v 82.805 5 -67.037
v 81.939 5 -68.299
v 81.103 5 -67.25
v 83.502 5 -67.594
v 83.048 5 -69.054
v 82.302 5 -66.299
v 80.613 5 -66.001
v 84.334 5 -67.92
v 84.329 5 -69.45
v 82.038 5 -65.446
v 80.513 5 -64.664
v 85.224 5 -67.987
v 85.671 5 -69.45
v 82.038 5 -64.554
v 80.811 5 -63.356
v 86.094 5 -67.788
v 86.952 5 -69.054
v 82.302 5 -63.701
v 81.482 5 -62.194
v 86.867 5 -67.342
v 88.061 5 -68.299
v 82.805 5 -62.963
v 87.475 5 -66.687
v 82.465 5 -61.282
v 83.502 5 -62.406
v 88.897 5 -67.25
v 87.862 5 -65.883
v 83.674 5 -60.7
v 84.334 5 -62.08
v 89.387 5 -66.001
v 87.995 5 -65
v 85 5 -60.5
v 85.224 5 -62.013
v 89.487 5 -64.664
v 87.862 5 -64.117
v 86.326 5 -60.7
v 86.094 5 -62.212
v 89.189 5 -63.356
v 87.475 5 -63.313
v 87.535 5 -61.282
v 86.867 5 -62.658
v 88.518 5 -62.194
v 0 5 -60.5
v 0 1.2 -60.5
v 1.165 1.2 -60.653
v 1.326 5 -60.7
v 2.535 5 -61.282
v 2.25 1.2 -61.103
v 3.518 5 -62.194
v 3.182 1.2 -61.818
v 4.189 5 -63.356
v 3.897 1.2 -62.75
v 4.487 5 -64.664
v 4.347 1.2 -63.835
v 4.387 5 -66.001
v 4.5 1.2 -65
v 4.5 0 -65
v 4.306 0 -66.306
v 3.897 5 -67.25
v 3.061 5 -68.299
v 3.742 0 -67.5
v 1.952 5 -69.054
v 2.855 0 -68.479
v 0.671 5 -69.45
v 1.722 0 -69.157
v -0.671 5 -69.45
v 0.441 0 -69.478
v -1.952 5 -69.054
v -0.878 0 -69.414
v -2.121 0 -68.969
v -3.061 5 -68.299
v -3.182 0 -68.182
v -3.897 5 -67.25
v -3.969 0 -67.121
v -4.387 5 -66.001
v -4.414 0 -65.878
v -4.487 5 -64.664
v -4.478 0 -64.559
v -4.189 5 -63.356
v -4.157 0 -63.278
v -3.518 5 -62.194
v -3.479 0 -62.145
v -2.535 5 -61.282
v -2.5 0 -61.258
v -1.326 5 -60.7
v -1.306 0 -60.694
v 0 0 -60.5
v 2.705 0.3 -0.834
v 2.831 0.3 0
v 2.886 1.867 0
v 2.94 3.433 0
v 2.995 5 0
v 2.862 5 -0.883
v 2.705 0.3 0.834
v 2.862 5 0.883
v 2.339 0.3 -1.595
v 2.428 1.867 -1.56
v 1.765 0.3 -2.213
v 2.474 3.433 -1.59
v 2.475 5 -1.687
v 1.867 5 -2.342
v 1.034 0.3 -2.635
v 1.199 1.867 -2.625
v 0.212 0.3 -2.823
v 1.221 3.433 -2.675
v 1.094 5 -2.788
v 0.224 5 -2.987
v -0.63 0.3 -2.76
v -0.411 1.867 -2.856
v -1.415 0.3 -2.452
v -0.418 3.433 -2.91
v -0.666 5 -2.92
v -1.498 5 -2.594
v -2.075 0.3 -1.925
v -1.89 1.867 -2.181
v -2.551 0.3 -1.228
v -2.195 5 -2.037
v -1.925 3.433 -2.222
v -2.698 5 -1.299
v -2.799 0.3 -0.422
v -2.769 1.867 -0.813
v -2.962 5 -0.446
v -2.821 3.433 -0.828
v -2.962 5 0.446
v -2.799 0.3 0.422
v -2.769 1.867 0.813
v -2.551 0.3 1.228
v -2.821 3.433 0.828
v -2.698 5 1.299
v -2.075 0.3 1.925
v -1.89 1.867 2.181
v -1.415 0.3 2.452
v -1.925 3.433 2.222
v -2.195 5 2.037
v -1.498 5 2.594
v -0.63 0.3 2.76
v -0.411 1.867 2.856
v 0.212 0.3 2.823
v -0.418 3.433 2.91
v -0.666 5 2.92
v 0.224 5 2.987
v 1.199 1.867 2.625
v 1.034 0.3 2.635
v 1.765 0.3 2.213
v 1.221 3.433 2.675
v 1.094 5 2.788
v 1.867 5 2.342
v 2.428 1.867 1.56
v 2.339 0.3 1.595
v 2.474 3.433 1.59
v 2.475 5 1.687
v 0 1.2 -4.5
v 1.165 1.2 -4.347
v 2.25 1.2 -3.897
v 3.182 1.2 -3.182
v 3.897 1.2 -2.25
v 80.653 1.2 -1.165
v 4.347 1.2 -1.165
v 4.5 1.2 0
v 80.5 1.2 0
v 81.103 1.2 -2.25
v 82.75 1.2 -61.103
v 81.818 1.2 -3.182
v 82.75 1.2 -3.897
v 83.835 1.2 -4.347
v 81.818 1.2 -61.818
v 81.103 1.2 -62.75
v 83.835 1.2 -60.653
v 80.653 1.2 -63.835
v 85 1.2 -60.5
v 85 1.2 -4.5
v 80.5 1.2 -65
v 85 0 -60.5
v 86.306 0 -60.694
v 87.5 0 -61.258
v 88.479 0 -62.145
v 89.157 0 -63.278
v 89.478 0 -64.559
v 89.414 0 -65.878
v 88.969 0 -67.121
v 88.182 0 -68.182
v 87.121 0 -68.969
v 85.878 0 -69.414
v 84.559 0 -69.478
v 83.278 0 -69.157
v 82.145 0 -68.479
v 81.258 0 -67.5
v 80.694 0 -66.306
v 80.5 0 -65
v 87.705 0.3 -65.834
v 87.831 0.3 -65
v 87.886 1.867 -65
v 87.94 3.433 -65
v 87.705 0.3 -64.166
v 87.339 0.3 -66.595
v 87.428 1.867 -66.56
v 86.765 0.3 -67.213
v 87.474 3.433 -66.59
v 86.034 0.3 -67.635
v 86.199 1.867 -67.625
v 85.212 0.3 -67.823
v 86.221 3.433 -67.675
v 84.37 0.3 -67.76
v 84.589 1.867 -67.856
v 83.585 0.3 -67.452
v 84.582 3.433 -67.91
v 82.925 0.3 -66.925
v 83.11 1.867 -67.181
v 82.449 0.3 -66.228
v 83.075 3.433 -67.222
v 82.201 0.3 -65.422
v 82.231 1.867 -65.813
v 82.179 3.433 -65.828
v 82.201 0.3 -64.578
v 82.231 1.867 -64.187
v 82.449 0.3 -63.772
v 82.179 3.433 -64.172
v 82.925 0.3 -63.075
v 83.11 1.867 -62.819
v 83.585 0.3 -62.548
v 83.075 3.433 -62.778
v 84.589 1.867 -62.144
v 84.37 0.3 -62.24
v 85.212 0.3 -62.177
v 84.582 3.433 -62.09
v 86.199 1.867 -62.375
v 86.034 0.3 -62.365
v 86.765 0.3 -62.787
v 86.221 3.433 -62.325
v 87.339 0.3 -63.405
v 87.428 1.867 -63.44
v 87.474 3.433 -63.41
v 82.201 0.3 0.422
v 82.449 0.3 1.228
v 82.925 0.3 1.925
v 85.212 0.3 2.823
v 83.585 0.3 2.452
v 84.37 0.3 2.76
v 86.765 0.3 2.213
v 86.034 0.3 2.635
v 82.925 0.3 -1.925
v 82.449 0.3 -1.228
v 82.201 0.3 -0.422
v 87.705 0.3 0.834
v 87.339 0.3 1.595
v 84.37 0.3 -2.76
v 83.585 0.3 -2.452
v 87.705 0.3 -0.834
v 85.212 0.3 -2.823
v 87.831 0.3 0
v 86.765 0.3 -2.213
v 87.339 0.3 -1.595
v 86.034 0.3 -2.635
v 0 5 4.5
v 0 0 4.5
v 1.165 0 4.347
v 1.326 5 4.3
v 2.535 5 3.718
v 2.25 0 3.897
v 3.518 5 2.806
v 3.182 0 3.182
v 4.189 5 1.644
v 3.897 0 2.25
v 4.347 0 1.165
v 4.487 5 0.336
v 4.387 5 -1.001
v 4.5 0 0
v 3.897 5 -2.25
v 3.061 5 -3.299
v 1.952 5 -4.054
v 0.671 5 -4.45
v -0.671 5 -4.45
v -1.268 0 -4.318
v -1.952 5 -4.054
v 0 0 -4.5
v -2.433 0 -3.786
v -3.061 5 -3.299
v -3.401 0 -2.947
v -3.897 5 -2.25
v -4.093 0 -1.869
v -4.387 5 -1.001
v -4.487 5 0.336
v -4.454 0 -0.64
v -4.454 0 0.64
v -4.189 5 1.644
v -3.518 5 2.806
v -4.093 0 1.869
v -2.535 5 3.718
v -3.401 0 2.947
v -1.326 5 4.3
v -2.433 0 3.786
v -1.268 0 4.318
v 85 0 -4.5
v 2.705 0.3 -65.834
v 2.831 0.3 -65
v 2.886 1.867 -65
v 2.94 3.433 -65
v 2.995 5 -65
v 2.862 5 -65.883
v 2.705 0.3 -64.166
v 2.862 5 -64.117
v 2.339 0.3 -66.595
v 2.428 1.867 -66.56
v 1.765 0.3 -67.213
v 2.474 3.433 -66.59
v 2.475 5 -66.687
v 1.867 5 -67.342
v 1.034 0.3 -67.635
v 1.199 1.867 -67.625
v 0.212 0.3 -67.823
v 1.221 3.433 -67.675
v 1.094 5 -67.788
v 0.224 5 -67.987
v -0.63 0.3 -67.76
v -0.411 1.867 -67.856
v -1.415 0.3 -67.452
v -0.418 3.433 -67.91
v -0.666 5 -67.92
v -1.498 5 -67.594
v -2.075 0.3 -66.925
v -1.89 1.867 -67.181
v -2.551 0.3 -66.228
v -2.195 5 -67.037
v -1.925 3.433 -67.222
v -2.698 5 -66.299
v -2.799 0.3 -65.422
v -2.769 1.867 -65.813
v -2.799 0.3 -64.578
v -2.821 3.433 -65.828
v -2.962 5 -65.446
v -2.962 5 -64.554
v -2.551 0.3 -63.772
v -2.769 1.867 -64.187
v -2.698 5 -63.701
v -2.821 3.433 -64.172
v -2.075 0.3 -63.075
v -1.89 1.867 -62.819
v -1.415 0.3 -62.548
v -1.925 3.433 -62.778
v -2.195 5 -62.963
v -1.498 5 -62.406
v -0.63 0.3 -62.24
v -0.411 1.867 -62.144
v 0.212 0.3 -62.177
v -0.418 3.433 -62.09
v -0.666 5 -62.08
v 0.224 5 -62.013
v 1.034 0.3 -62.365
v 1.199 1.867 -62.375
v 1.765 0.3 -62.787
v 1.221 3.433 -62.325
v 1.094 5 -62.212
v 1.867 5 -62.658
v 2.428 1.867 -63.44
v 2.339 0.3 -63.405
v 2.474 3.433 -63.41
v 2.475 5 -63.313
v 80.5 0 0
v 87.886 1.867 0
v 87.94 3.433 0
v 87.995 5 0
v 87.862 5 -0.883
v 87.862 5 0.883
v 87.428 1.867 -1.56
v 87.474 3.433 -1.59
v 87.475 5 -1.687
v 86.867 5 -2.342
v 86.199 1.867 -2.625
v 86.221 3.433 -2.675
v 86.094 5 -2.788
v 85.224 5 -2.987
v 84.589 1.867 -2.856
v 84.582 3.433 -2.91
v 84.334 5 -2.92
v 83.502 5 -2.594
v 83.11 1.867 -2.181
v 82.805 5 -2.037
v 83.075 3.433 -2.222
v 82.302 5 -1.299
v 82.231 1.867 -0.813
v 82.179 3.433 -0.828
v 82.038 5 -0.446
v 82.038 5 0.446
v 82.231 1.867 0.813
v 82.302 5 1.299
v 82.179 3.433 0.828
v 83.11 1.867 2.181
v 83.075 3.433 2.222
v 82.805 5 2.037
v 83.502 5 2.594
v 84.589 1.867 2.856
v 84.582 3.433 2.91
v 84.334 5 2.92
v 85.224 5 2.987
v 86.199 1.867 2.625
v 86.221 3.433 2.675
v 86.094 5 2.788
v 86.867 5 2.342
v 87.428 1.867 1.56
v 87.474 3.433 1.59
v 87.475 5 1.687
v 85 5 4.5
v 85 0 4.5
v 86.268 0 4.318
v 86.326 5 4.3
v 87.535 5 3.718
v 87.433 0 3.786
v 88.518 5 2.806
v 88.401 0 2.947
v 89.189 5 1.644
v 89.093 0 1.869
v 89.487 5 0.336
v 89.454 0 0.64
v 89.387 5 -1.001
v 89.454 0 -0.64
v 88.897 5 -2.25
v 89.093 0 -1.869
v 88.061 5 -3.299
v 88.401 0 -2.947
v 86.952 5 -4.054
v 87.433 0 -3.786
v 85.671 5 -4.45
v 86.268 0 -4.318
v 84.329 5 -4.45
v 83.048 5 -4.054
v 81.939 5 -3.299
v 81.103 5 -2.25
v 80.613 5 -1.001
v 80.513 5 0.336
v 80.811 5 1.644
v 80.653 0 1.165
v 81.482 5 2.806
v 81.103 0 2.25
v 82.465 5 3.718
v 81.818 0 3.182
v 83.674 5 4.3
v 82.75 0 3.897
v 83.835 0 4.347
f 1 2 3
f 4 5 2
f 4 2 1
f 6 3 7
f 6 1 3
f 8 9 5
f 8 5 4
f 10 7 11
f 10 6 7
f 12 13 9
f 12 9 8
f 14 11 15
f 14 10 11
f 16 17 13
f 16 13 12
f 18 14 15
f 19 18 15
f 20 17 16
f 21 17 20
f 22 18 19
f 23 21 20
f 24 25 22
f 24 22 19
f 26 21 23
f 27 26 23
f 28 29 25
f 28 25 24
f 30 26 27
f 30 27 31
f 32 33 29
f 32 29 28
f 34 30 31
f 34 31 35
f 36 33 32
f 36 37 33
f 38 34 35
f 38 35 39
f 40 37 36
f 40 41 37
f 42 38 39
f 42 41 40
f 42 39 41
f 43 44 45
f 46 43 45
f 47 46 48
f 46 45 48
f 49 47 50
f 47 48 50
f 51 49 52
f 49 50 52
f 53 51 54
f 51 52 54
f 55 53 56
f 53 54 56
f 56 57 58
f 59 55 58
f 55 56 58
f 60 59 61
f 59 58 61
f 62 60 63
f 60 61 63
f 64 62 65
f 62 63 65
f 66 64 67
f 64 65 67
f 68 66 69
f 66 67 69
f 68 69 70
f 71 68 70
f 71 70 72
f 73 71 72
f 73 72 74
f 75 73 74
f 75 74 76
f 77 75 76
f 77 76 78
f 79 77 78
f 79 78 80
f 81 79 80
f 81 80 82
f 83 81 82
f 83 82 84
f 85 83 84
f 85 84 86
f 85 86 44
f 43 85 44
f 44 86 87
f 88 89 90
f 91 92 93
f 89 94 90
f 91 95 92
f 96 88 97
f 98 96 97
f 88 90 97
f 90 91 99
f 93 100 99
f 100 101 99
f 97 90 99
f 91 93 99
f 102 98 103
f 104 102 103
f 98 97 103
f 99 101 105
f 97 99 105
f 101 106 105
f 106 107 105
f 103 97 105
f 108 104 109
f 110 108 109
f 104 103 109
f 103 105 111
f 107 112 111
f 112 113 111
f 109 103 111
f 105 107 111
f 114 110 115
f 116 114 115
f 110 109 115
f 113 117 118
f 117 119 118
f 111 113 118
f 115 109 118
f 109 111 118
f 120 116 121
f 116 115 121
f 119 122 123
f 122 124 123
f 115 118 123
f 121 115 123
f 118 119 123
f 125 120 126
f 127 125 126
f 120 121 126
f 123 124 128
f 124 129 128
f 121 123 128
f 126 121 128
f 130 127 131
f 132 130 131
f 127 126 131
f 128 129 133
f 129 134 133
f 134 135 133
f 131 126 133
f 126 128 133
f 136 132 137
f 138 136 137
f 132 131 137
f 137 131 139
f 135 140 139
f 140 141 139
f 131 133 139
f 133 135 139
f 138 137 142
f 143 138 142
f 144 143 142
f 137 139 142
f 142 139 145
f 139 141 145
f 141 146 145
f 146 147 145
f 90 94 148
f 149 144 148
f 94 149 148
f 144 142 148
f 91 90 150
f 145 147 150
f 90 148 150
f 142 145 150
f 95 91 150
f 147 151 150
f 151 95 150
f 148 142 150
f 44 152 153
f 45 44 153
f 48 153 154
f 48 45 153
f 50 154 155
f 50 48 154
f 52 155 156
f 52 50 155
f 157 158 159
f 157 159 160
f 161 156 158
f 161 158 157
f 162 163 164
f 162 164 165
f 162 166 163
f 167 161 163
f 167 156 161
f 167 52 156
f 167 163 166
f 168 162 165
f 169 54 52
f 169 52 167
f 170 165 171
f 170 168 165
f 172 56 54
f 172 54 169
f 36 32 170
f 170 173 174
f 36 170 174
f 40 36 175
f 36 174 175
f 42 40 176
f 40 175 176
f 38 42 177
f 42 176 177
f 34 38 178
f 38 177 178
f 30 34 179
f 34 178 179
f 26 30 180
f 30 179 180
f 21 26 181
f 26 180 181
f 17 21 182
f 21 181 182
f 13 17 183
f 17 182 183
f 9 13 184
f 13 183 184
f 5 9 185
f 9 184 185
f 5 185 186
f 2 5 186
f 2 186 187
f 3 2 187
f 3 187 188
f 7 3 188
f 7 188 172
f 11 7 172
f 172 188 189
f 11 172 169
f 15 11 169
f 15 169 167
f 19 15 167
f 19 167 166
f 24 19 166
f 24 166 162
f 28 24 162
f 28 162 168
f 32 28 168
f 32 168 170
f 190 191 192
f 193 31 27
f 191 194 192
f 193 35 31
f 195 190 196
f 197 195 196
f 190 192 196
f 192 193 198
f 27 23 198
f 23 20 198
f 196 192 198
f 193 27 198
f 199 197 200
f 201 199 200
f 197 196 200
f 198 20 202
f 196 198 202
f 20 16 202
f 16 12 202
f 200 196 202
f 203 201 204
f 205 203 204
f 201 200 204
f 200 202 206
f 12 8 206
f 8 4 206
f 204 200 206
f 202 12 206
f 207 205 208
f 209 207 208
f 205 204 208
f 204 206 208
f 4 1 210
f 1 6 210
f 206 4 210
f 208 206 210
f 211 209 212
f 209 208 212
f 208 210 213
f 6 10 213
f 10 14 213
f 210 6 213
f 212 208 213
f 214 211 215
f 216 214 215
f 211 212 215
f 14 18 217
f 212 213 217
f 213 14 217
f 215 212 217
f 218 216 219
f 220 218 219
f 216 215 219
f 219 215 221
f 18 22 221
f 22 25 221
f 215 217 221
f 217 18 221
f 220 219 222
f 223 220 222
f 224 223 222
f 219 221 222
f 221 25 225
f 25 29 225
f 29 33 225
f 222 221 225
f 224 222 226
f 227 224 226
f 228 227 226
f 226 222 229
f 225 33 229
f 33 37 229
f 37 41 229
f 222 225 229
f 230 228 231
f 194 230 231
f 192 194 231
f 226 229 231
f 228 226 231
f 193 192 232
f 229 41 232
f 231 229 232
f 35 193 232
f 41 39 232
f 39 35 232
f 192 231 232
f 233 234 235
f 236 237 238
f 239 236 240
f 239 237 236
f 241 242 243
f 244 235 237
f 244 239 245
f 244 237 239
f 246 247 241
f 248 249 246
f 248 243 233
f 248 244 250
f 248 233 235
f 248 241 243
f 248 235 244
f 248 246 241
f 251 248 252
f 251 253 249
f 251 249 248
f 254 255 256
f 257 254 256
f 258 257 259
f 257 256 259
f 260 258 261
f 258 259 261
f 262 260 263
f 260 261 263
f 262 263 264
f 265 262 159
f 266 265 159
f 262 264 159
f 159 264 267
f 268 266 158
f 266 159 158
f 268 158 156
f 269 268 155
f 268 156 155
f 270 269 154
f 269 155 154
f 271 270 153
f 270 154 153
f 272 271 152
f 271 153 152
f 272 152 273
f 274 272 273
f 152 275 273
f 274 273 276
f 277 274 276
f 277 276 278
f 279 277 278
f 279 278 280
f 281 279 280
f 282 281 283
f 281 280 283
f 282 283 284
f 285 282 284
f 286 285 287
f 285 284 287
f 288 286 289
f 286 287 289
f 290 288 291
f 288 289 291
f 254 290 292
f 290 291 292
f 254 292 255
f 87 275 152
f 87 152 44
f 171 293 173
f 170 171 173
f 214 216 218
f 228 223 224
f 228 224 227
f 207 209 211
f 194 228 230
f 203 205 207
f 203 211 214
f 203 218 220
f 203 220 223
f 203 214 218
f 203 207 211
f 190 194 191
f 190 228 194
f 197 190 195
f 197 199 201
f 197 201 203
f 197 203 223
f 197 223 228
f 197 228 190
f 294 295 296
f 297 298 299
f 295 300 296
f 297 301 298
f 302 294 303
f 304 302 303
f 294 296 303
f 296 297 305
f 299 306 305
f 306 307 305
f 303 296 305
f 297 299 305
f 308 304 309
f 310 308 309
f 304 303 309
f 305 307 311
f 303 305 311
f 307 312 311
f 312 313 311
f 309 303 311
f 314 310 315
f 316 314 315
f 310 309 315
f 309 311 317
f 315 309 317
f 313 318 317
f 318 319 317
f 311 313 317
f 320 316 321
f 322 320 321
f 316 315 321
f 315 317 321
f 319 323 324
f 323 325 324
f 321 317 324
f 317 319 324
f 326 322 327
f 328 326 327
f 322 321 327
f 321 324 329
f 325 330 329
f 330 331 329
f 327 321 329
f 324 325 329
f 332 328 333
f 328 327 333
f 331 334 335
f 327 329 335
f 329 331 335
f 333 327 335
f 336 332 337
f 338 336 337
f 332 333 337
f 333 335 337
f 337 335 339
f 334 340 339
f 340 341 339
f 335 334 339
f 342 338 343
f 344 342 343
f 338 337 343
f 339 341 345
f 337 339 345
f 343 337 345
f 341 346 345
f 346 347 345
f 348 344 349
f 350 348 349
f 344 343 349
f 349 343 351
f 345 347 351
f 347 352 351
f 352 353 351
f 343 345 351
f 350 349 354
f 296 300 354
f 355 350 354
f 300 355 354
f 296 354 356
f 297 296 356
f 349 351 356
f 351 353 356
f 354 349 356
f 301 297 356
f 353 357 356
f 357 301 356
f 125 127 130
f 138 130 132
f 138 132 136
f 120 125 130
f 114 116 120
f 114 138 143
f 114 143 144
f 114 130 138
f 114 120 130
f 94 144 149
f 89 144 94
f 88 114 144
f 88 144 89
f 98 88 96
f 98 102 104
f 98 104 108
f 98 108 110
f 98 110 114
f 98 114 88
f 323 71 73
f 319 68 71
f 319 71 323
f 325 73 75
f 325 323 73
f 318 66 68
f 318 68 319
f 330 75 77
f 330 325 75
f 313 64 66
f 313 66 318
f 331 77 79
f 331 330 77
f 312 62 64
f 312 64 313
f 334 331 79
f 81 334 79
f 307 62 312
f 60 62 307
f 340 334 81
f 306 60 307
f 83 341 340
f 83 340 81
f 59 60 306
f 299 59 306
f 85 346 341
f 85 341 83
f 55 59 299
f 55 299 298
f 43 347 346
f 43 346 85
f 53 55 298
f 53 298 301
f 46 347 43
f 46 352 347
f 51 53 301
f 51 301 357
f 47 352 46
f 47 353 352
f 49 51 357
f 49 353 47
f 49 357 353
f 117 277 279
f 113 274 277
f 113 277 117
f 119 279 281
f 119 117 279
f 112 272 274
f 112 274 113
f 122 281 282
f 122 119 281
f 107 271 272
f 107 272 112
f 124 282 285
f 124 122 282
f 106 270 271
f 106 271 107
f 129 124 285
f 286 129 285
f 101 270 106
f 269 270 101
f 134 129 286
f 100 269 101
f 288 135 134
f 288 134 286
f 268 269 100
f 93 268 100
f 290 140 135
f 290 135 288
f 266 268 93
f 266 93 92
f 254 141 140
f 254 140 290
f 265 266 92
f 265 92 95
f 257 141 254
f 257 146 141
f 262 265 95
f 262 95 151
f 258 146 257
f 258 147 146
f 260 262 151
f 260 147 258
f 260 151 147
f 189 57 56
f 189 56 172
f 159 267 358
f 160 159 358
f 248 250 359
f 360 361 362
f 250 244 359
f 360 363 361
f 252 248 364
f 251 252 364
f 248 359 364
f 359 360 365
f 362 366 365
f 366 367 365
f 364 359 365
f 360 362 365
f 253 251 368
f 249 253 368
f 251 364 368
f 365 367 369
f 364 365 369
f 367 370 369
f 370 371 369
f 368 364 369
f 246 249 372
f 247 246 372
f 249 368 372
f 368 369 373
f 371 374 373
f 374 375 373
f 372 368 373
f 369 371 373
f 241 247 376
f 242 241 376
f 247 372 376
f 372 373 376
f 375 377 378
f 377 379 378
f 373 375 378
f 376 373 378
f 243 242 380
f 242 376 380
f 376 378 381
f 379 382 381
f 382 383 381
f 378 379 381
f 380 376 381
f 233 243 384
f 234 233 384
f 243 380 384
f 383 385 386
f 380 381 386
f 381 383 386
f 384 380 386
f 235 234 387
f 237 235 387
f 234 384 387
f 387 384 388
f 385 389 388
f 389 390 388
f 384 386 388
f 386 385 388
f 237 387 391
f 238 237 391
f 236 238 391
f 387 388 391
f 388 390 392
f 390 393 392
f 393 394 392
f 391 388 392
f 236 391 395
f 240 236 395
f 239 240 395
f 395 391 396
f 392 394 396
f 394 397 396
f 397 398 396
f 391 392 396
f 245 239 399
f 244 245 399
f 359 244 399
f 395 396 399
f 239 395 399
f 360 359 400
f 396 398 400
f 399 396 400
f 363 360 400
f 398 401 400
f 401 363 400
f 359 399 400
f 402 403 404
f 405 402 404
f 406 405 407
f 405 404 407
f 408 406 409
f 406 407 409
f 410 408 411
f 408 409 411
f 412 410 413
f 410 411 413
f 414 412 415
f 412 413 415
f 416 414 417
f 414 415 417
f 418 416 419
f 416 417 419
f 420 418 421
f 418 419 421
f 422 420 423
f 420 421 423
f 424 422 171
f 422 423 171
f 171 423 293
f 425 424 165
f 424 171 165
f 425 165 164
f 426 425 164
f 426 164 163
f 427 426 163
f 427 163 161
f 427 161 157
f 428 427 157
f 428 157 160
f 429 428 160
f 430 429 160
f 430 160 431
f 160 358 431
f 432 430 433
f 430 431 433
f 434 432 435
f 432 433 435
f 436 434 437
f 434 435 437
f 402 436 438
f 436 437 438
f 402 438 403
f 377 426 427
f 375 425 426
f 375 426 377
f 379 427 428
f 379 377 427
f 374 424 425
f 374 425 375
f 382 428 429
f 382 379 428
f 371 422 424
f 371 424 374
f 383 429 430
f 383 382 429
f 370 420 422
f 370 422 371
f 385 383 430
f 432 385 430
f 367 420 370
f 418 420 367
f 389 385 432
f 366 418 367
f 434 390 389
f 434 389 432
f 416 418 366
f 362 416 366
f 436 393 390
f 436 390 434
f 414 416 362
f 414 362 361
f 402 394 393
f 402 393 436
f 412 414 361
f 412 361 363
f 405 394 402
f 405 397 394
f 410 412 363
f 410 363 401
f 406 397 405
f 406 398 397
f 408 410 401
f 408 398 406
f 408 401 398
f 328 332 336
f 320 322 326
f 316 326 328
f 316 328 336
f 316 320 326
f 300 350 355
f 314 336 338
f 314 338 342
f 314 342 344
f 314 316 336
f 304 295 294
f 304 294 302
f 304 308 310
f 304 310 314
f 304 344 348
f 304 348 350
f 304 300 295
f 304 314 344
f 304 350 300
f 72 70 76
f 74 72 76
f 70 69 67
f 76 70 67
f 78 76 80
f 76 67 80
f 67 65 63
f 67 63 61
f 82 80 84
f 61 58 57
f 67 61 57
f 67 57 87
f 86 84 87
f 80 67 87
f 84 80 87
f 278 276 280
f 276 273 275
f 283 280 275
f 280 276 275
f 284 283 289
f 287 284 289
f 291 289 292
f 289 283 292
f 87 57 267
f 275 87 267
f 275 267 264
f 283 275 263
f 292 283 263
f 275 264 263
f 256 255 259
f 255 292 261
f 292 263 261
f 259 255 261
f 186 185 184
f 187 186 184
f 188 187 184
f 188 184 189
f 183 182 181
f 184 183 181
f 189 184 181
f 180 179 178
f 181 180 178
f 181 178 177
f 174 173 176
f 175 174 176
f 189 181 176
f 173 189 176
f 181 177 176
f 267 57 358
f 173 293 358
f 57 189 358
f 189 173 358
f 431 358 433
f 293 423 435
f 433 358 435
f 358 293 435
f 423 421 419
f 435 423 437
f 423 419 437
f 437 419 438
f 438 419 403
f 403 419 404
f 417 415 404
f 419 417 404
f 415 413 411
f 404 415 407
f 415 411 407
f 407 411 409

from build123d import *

# Parameters (mm, degrees)
SKETCH1_R                      = 4.5
BOSSES_DEPTH                   = 5
BOSSES_2_DEPTH                 = 5
BOSSES_3_DEPTH                 = 5
BOSSES_4_DEPTH                 = 5
SKETCH2_W                      = 85
SKETCH2_H                      = 65
BASE_DEPTH                     = 1.2
SKETCH3_R                      = 2.995
INSERT_POCKETS_DEPTH           = 4.7
INSERT_POCKETS_DRAFT           = -2
INSERT_POCKETS_PROFILE_2_DEPTH = 4.7
INSERT_POCKETS_PROFILE_2_DRAFT = -2
INSERT_POCKETS_PROFILE_3_DEPTH = 4.7
INSERT_POCKETS_PROFILE_3_DRAFT = -2
INSERT_POCKETS_PROFILE_4_DEPTH = 4.7
INSERT_POCKETS_PROFILE_4_DRAFT = -2


with BuildPart() as part:
    # Sketch1 → Bosses (new body)
    with BuildSketch(Plane(origin=(0, 0, 0), x_dir=(1, 0, 0), z_dir=(0, 1, 0))):
        with Locations(Location((0, 0, 0), (0, 0, 270))):
            Circle(SKETCH1_R)
    extrude(amount=BOSSES_DEPTH)



with BuildPart() as body_2:
    # Sketch1 → Bosses 2 (new body)
    with BuildSketch(Plane(origin=(0, 0, 0), x_dir=(1, 0, 0), z_dir=(0, 1, 0))):
        with Locations(Location((85, 0, 0), (0, 0, 270))):
            Circle(SKETCH1_R)
    extrude(amount=BOSSES_2_DEPTH)


with BuildPart() as body_3:
    # Sketch1 → Bosses 3 (new body)
    with BuildSketch(Plane(origin=(0, 0, 0), x_dir=(1, 0, 0), z_dir=(0, 1, 0))):
        with Locations(Location((85, 65, 0), (0, 0, 270))):
            Circle(SKETCH1_R)
    extrude(amount=BOSSES_3_DEPTH)


with BuildPart() as body_4:
    # Sketch1 → Bosses 4 (new body)
    with BuildSketch(Plane(origin=(0, 0, 0), x_dir=(1, 0, 0), z_dir=(0, 1, 0))):
        with Locations(Location((0, 65, 0), (0, 0, 270))):
            Circle(SKETCH1_R)
    extrude(amount=BOSSES_4_DEPTH)


with BuildPart() as part_1:
    add(part.part)

    add(body_2.part)  # Base merges body 2

    add(body_3.part)  # Base merges body 3

    add(body_4.part)  # Base merges body 4
    # Sketch2 → Base (add)
    with BuildSketch(Plane(origin=(0, 0, 0), x_dir=(1, 0, 0), z_dir=(0, 1, 0))):
        with Locations((42.5, 32.5)):
            Rectangle(SKETCH2_W, SKETCH2_H)
    extrude(amount=BASE_DEPTH)


with BuildPart() as insert_pockets_tool:
    # Sketch3 → Insert pockets (with draft: the straight prism first)
    with BuildSketch(Plane(origin=(0, 5, 0), x_dir=(1, 0, 0), z_dir=(0, 1, 0))):
        with Locations((0, 65)):
            Circle(SKETCH3_R)
    extrude(amount=-INSERT_POCKETS_DEPTH)
    # Insert pockets: the draft: its side faces are tilted about the plane it starts from
    insert_pockets_sides = [insert_pockets_tool.faces().sort_by_distance(p)[0] for p in [
        (-2.995, 2.65, -65),
    ]]
    draft(insert_pockets_sides, Plane(origin=(0, 5, 0), x_dir=(1, 0, 0), z_dir=(0, 1, 0)), INSERT_POCKETS_DRAFT)


with BuildPart() as part_2:
    add(part_1.part)

    # Insert pockets: cut by insert_pockets_tool
    add(insert_pockets_tool.part, mode=Mode.SUBTRACT)


with BuildPart() as insert_pockets_profile_2_tool:
    # Sketch3 → Insert pockets profile 2 (with draft: the straight prism first)
    with BuildSketch(Plane(origin=(0, 5, 0), x_dir=(1, 0, 0), z_dir=(0, 1, 0))):
        with Locations((85, 65)):
            Circle(SKETCH3_R)
    extrude(amount=-INSERT_POCKETS_PROFILE_2_DEPTH)
    # Insert pockets profile 2: the draft: its side faces are tilted about the plane it starts from
    insert_pockets_profile_2_sides = [insert_pockets_profile_2_tool.faces().sort_by_distance(p)[0] for p in [
        (82.005, 2.65, -65),
    ]]
    draft(insert_pockets_profile_2_sides, Plane(origin=(0, 5, 0), x_dir=(1, 0, 0), z_dir=(0, 1, 0)), INSERT_POCKETS_PROFILE_2_DRAFT)


with BuildPart() as part_3:
    add(part_2.part)

    # Insert pockets profile 2: cut by insert_pockets_profile_2_tool
    add(insert_pockets_profile_2_tool.part, mode=Mode.SUBTRACT)


with BuildPart() as insert_pockets_profile_3_tool:
    # Sketch3 → Insert pockets profile 3 (with draft: the straight prism first)
    with BuildSketch(Plane(origin=(0, 5, 0), x_dir=(1, 0, 0), z_dir=(0, 1, 0))):
        with Locations((85, 0)):
            Circle(SKETCH3_R)
    extrude(amount=-INSERT_POCKETS_PROFILE_3_DEPTH)
    # Insert pockets profile 3: the draft: its side faces are tilted about the plane it starts from
    insert_pockets_profile_3_sides = [insert_pockets_profile_3_tool.faces().sort_by_distance(p)[0] for p in [
        (82.005, 2.65, 0),
    ]]
    draft(insert_pockets_profile_3_sides, Plane(origin=(0, 5, 0), x_dir=(1, 0, 0), z_dir=(0, 1, 0)), INSERT_POCKETS_PROFILE_3_DRAFT)


with BuildPart() as part_4:
    add(part_3.part)

    # Insert pockets profile 3: cut by insert_pockets_profile_3_tool
    add(insert_pockets_profile_3_tool.part, mode=Mode.SUBTRACT)


with BuildPart() as insert_pockets_profile_4_tool:
    # Sketch3 → Insert pockets profile 4 (with draft: the straight prism first)
    with BuildSketch(Plane(origin=(0, 5, 0), x_dir=(1, 0, 0), z_dir=(0, 1, 0))):
        Circle(SKETCH3_R)
    extrude(amount=-INSERT_POCKETS_PROFILE_4_DEPTH)
    # Insert pockets profile 4: the draft: its side faces are tilted about the plane it starts from
    insert_pockets_profile_4_sides = [insert_pockets_profile_4_tool.faces().sort_by_distance(p)[0] for p in [
        (-2.995, 2.65, 0),
    ]]
    draft(insert_pockets_profile_4_sides, Plane(origin=(0, 5, 0), x_dir=(1, 0, 0), z_dir=(0, 1, 0)), INSERT_POCKETS_PROFILE_4_DRAFT)


with BuildPart() as part_5:
    add(part_4.part)

    # Insert pockets profile 4: cut by insert_pockets_profile_4_tool
    add(insert_pockets_profile_4_tool.part, mode=Mode.SUBTRACT)


solid = part_5.part
